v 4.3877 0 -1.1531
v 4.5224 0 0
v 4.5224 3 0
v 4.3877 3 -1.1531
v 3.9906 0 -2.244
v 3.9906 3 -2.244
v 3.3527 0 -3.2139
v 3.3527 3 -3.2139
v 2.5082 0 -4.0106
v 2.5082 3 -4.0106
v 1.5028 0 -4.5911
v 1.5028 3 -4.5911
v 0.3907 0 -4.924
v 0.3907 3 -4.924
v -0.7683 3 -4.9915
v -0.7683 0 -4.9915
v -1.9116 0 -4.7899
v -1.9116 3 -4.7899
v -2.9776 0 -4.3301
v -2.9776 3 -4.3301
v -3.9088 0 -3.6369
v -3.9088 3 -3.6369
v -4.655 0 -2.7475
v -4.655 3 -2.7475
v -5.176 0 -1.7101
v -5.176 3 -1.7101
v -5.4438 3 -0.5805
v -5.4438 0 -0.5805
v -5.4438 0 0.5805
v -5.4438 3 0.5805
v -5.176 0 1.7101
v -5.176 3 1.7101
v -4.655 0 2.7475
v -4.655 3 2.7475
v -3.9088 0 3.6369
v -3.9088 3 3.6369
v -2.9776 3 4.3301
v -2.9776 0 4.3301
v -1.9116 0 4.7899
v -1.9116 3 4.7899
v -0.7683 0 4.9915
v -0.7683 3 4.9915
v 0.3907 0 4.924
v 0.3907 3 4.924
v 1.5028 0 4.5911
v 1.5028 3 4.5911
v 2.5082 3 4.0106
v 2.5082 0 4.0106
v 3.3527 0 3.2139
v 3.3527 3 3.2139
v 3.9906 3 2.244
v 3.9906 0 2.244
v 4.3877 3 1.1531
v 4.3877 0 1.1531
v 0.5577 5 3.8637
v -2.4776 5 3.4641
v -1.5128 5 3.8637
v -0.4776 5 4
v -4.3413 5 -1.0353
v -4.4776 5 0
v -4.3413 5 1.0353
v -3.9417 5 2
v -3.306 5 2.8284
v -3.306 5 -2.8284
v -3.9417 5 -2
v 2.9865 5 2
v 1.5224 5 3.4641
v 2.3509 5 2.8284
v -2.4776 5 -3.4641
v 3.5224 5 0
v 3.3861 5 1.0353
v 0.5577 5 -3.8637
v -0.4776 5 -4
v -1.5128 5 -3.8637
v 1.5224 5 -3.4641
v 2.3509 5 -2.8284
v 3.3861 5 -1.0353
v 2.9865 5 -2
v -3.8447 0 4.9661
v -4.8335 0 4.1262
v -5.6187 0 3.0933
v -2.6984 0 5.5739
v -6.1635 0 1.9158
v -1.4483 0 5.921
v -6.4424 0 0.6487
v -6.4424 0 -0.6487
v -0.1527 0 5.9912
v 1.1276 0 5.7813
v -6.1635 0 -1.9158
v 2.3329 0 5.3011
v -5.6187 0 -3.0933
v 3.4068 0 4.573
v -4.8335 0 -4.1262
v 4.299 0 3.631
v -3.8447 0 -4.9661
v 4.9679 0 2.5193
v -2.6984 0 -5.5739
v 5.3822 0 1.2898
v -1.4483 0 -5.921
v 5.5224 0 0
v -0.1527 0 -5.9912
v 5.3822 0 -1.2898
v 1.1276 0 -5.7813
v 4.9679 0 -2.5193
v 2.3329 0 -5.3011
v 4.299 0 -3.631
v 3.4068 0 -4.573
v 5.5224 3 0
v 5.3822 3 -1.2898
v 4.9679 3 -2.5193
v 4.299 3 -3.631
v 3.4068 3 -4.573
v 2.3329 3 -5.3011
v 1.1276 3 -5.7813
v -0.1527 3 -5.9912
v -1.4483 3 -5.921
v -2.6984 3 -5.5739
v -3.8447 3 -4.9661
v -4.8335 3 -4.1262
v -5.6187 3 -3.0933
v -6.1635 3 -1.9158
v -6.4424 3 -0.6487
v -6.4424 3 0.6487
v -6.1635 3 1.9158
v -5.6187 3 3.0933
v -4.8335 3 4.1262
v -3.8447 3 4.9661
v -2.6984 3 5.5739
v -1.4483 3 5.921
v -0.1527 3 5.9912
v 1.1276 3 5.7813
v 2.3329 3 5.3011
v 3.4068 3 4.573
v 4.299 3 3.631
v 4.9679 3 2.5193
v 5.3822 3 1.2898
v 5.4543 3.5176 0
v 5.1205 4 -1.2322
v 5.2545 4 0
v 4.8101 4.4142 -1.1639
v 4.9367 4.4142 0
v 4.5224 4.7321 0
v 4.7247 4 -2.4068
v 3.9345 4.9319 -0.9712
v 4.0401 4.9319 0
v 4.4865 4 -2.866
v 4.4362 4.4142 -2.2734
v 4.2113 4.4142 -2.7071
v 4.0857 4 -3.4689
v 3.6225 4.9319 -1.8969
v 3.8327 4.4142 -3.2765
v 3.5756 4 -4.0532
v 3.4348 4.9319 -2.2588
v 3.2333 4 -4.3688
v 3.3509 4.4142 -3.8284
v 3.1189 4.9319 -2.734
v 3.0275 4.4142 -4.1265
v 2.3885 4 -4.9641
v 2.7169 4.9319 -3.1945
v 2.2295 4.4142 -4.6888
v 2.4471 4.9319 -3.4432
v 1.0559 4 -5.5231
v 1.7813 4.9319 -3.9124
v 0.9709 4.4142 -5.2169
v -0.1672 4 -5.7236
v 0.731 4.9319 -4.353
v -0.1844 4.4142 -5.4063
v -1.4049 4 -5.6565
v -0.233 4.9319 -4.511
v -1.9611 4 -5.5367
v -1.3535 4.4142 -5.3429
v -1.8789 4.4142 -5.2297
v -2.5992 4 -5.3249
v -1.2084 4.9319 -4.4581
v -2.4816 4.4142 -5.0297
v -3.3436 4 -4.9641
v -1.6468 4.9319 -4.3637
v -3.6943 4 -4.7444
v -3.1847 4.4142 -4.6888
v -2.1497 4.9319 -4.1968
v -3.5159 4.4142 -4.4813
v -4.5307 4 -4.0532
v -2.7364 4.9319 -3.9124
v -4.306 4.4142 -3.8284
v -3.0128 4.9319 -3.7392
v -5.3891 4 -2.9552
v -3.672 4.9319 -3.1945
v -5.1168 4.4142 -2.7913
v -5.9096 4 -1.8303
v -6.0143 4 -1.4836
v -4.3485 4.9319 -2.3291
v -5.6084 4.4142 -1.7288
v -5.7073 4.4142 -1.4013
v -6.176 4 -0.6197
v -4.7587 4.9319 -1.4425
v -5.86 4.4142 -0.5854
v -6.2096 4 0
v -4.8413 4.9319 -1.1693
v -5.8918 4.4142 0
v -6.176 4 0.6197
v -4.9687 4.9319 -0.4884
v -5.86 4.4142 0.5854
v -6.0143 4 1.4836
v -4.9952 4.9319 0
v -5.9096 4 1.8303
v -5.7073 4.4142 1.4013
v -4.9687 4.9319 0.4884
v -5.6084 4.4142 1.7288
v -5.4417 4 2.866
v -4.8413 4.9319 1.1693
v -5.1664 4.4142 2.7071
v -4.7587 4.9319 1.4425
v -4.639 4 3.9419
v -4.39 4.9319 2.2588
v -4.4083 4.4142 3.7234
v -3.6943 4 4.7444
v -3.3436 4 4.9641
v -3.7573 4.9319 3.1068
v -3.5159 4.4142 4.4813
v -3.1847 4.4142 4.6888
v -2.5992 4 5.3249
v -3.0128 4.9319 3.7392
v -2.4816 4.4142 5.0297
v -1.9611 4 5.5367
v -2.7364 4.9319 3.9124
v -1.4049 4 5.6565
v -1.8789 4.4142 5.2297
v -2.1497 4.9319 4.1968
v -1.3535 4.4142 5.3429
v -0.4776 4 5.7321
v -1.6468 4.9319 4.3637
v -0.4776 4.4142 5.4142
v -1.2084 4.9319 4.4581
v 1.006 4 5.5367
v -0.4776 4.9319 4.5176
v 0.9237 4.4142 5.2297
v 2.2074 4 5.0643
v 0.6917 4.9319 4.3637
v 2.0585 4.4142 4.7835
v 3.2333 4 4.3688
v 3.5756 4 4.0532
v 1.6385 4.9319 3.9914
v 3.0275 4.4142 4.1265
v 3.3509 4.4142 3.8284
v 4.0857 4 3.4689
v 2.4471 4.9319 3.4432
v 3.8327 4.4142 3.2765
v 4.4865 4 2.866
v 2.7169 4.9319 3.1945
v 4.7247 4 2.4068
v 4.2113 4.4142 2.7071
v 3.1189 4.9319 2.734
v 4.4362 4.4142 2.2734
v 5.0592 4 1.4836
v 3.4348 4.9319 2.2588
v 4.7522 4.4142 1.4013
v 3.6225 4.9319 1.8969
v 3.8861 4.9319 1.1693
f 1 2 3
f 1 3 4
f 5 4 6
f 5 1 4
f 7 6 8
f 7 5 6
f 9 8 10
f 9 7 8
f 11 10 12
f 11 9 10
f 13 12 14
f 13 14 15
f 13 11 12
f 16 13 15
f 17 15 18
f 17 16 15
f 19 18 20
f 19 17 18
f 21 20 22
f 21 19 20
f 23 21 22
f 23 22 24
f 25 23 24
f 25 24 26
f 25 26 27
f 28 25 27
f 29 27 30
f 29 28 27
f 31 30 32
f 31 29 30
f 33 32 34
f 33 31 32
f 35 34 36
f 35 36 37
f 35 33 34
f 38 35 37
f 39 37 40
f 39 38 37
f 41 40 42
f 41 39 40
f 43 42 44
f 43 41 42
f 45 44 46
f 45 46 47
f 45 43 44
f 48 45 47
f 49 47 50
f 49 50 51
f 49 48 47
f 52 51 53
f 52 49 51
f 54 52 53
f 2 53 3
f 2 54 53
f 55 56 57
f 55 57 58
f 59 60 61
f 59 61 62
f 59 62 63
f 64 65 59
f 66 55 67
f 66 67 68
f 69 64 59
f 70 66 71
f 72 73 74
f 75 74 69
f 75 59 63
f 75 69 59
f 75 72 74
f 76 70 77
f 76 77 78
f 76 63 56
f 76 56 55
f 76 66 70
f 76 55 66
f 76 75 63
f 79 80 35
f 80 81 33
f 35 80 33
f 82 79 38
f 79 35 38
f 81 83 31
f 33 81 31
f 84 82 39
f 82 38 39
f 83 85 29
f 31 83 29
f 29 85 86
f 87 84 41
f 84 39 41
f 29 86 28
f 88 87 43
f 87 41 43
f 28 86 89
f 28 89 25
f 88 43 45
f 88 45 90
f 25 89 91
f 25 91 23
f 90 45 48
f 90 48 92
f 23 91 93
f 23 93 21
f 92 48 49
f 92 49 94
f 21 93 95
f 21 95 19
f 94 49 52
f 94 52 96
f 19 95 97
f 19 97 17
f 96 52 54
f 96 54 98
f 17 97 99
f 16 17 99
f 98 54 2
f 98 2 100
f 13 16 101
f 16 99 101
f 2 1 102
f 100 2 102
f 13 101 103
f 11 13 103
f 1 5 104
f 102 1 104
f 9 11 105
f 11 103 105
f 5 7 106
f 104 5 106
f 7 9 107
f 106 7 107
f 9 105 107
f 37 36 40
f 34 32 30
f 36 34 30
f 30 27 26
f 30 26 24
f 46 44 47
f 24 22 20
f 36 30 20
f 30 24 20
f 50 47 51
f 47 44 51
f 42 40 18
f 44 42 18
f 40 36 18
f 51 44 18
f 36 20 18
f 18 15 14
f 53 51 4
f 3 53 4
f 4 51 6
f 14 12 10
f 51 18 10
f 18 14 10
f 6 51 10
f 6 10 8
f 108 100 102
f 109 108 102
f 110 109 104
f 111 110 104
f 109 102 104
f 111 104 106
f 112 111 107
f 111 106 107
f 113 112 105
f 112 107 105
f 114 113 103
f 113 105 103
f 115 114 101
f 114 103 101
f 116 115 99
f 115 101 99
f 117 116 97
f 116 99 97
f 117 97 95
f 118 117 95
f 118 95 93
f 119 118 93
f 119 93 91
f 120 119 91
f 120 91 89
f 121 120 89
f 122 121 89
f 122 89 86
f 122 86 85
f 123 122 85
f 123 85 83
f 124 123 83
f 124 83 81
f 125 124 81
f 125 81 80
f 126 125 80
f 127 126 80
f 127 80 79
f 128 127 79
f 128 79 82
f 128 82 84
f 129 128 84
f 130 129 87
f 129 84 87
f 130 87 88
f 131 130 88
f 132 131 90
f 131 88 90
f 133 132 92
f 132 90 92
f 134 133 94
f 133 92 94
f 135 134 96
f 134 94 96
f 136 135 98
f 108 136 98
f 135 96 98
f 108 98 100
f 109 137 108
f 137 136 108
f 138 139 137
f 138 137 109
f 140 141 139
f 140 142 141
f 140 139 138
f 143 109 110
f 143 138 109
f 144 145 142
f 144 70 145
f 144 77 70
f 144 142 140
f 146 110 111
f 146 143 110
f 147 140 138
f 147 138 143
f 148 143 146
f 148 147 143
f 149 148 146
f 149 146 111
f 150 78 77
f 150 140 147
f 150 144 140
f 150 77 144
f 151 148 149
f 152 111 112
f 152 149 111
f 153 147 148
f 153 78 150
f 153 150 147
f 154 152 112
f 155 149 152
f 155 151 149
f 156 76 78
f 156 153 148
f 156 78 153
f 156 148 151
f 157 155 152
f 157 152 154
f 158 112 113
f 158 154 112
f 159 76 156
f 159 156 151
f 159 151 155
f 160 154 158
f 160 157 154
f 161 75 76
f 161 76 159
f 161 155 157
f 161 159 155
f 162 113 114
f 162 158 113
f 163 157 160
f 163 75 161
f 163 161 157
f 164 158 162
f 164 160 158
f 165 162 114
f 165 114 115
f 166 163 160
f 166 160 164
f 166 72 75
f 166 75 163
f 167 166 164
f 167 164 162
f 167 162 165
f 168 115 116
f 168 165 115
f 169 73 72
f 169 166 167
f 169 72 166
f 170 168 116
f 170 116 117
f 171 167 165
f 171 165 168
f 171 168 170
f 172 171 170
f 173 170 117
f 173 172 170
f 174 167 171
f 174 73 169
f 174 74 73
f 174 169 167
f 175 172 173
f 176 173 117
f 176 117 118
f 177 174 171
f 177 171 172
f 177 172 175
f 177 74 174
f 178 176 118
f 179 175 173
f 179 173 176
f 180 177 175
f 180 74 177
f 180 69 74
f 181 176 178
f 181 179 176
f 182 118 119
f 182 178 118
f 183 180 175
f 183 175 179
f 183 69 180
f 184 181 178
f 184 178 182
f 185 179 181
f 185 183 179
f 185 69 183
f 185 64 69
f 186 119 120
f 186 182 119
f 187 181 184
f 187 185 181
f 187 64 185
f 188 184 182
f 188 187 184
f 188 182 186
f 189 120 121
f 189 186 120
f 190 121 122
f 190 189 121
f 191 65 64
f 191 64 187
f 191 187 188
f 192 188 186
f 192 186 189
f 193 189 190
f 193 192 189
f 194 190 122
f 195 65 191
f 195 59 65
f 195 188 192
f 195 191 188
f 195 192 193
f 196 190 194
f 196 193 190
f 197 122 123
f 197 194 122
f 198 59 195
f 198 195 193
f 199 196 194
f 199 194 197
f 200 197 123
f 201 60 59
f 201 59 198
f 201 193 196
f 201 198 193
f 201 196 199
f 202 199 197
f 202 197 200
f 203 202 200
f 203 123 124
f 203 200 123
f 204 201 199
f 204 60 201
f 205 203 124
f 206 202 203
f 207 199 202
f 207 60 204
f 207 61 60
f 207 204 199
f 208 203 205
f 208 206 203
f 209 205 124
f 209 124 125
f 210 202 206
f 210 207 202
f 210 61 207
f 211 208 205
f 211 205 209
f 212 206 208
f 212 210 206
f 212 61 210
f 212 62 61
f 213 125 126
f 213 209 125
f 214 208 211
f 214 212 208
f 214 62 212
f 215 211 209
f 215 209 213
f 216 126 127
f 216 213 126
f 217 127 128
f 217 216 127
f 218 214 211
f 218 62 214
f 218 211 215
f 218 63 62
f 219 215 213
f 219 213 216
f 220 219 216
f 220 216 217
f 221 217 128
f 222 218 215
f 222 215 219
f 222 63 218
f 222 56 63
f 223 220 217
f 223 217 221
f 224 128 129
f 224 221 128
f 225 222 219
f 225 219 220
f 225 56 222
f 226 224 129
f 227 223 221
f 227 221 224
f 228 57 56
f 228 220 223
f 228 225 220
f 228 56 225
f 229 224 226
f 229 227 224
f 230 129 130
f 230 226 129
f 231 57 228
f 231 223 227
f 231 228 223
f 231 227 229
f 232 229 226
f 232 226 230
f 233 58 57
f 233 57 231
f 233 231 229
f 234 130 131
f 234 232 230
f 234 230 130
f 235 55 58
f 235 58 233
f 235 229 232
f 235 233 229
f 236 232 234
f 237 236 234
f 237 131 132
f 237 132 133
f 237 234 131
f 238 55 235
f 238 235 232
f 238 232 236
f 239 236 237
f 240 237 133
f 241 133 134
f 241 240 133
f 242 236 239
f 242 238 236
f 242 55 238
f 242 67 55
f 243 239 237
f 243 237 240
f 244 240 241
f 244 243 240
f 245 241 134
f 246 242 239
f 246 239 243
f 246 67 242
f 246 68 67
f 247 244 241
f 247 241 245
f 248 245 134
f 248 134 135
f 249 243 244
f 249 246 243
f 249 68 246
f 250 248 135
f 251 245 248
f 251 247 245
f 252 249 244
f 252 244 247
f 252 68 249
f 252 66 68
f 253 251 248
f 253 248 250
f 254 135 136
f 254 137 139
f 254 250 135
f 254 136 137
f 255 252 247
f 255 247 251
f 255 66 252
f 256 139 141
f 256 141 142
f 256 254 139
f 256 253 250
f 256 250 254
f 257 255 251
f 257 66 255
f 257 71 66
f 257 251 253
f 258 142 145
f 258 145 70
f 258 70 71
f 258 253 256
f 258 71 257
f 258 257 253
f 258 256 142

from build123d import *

# Parameters (mm, degrees)
SKETCH1_R           = 6
SKETCH1_R_2         = 5
BOSS_EXTRUDE1_DEPTH = 3
SKETCH2_R           = 6
BOSS_EXTRUDE2_DEPTH = 2
FILLET1_R           = 2


with BuildPart() as part:
    # Sketch1 → Boss-Extrude1 (new body)
    with BuildSketch(Plane(origin=(0, 0, 0), x_dir=(1, 0, 0), z_dir=(0, 1, 0))):
        with Locations((-0.477560777, 0)):
            Circle(SKETCH1_R)
        with Locations((-0.477560777, 0)):
            Circle(SKETCH1_R_2, mode=Mode.SUBTRACT)
    extrude(amount=BOSS_EXTRUDE1_DEPTH)

    # Sketch2 → Boss-Extrude2 (add)
    with BuildSketch(Plane(origin=(0, 3, 0), x_dir=(1, 0, 0), z_dir=(0, 1, 0))):
        with Locations((-0.477560777, 0)):
            Circle(SKETCH2_R)
    extrude(amount=BOSS_EXTRUDE2_DEPTH)

    # Fillet1
    fillet1_edges = [part.edges().sort_by_distance(p)[0] for p in [
        (-6.477560777, 5, 0),
    ]]
    fillet(fillet1_edges, radius=FILLET1_R)


solid = part.part
